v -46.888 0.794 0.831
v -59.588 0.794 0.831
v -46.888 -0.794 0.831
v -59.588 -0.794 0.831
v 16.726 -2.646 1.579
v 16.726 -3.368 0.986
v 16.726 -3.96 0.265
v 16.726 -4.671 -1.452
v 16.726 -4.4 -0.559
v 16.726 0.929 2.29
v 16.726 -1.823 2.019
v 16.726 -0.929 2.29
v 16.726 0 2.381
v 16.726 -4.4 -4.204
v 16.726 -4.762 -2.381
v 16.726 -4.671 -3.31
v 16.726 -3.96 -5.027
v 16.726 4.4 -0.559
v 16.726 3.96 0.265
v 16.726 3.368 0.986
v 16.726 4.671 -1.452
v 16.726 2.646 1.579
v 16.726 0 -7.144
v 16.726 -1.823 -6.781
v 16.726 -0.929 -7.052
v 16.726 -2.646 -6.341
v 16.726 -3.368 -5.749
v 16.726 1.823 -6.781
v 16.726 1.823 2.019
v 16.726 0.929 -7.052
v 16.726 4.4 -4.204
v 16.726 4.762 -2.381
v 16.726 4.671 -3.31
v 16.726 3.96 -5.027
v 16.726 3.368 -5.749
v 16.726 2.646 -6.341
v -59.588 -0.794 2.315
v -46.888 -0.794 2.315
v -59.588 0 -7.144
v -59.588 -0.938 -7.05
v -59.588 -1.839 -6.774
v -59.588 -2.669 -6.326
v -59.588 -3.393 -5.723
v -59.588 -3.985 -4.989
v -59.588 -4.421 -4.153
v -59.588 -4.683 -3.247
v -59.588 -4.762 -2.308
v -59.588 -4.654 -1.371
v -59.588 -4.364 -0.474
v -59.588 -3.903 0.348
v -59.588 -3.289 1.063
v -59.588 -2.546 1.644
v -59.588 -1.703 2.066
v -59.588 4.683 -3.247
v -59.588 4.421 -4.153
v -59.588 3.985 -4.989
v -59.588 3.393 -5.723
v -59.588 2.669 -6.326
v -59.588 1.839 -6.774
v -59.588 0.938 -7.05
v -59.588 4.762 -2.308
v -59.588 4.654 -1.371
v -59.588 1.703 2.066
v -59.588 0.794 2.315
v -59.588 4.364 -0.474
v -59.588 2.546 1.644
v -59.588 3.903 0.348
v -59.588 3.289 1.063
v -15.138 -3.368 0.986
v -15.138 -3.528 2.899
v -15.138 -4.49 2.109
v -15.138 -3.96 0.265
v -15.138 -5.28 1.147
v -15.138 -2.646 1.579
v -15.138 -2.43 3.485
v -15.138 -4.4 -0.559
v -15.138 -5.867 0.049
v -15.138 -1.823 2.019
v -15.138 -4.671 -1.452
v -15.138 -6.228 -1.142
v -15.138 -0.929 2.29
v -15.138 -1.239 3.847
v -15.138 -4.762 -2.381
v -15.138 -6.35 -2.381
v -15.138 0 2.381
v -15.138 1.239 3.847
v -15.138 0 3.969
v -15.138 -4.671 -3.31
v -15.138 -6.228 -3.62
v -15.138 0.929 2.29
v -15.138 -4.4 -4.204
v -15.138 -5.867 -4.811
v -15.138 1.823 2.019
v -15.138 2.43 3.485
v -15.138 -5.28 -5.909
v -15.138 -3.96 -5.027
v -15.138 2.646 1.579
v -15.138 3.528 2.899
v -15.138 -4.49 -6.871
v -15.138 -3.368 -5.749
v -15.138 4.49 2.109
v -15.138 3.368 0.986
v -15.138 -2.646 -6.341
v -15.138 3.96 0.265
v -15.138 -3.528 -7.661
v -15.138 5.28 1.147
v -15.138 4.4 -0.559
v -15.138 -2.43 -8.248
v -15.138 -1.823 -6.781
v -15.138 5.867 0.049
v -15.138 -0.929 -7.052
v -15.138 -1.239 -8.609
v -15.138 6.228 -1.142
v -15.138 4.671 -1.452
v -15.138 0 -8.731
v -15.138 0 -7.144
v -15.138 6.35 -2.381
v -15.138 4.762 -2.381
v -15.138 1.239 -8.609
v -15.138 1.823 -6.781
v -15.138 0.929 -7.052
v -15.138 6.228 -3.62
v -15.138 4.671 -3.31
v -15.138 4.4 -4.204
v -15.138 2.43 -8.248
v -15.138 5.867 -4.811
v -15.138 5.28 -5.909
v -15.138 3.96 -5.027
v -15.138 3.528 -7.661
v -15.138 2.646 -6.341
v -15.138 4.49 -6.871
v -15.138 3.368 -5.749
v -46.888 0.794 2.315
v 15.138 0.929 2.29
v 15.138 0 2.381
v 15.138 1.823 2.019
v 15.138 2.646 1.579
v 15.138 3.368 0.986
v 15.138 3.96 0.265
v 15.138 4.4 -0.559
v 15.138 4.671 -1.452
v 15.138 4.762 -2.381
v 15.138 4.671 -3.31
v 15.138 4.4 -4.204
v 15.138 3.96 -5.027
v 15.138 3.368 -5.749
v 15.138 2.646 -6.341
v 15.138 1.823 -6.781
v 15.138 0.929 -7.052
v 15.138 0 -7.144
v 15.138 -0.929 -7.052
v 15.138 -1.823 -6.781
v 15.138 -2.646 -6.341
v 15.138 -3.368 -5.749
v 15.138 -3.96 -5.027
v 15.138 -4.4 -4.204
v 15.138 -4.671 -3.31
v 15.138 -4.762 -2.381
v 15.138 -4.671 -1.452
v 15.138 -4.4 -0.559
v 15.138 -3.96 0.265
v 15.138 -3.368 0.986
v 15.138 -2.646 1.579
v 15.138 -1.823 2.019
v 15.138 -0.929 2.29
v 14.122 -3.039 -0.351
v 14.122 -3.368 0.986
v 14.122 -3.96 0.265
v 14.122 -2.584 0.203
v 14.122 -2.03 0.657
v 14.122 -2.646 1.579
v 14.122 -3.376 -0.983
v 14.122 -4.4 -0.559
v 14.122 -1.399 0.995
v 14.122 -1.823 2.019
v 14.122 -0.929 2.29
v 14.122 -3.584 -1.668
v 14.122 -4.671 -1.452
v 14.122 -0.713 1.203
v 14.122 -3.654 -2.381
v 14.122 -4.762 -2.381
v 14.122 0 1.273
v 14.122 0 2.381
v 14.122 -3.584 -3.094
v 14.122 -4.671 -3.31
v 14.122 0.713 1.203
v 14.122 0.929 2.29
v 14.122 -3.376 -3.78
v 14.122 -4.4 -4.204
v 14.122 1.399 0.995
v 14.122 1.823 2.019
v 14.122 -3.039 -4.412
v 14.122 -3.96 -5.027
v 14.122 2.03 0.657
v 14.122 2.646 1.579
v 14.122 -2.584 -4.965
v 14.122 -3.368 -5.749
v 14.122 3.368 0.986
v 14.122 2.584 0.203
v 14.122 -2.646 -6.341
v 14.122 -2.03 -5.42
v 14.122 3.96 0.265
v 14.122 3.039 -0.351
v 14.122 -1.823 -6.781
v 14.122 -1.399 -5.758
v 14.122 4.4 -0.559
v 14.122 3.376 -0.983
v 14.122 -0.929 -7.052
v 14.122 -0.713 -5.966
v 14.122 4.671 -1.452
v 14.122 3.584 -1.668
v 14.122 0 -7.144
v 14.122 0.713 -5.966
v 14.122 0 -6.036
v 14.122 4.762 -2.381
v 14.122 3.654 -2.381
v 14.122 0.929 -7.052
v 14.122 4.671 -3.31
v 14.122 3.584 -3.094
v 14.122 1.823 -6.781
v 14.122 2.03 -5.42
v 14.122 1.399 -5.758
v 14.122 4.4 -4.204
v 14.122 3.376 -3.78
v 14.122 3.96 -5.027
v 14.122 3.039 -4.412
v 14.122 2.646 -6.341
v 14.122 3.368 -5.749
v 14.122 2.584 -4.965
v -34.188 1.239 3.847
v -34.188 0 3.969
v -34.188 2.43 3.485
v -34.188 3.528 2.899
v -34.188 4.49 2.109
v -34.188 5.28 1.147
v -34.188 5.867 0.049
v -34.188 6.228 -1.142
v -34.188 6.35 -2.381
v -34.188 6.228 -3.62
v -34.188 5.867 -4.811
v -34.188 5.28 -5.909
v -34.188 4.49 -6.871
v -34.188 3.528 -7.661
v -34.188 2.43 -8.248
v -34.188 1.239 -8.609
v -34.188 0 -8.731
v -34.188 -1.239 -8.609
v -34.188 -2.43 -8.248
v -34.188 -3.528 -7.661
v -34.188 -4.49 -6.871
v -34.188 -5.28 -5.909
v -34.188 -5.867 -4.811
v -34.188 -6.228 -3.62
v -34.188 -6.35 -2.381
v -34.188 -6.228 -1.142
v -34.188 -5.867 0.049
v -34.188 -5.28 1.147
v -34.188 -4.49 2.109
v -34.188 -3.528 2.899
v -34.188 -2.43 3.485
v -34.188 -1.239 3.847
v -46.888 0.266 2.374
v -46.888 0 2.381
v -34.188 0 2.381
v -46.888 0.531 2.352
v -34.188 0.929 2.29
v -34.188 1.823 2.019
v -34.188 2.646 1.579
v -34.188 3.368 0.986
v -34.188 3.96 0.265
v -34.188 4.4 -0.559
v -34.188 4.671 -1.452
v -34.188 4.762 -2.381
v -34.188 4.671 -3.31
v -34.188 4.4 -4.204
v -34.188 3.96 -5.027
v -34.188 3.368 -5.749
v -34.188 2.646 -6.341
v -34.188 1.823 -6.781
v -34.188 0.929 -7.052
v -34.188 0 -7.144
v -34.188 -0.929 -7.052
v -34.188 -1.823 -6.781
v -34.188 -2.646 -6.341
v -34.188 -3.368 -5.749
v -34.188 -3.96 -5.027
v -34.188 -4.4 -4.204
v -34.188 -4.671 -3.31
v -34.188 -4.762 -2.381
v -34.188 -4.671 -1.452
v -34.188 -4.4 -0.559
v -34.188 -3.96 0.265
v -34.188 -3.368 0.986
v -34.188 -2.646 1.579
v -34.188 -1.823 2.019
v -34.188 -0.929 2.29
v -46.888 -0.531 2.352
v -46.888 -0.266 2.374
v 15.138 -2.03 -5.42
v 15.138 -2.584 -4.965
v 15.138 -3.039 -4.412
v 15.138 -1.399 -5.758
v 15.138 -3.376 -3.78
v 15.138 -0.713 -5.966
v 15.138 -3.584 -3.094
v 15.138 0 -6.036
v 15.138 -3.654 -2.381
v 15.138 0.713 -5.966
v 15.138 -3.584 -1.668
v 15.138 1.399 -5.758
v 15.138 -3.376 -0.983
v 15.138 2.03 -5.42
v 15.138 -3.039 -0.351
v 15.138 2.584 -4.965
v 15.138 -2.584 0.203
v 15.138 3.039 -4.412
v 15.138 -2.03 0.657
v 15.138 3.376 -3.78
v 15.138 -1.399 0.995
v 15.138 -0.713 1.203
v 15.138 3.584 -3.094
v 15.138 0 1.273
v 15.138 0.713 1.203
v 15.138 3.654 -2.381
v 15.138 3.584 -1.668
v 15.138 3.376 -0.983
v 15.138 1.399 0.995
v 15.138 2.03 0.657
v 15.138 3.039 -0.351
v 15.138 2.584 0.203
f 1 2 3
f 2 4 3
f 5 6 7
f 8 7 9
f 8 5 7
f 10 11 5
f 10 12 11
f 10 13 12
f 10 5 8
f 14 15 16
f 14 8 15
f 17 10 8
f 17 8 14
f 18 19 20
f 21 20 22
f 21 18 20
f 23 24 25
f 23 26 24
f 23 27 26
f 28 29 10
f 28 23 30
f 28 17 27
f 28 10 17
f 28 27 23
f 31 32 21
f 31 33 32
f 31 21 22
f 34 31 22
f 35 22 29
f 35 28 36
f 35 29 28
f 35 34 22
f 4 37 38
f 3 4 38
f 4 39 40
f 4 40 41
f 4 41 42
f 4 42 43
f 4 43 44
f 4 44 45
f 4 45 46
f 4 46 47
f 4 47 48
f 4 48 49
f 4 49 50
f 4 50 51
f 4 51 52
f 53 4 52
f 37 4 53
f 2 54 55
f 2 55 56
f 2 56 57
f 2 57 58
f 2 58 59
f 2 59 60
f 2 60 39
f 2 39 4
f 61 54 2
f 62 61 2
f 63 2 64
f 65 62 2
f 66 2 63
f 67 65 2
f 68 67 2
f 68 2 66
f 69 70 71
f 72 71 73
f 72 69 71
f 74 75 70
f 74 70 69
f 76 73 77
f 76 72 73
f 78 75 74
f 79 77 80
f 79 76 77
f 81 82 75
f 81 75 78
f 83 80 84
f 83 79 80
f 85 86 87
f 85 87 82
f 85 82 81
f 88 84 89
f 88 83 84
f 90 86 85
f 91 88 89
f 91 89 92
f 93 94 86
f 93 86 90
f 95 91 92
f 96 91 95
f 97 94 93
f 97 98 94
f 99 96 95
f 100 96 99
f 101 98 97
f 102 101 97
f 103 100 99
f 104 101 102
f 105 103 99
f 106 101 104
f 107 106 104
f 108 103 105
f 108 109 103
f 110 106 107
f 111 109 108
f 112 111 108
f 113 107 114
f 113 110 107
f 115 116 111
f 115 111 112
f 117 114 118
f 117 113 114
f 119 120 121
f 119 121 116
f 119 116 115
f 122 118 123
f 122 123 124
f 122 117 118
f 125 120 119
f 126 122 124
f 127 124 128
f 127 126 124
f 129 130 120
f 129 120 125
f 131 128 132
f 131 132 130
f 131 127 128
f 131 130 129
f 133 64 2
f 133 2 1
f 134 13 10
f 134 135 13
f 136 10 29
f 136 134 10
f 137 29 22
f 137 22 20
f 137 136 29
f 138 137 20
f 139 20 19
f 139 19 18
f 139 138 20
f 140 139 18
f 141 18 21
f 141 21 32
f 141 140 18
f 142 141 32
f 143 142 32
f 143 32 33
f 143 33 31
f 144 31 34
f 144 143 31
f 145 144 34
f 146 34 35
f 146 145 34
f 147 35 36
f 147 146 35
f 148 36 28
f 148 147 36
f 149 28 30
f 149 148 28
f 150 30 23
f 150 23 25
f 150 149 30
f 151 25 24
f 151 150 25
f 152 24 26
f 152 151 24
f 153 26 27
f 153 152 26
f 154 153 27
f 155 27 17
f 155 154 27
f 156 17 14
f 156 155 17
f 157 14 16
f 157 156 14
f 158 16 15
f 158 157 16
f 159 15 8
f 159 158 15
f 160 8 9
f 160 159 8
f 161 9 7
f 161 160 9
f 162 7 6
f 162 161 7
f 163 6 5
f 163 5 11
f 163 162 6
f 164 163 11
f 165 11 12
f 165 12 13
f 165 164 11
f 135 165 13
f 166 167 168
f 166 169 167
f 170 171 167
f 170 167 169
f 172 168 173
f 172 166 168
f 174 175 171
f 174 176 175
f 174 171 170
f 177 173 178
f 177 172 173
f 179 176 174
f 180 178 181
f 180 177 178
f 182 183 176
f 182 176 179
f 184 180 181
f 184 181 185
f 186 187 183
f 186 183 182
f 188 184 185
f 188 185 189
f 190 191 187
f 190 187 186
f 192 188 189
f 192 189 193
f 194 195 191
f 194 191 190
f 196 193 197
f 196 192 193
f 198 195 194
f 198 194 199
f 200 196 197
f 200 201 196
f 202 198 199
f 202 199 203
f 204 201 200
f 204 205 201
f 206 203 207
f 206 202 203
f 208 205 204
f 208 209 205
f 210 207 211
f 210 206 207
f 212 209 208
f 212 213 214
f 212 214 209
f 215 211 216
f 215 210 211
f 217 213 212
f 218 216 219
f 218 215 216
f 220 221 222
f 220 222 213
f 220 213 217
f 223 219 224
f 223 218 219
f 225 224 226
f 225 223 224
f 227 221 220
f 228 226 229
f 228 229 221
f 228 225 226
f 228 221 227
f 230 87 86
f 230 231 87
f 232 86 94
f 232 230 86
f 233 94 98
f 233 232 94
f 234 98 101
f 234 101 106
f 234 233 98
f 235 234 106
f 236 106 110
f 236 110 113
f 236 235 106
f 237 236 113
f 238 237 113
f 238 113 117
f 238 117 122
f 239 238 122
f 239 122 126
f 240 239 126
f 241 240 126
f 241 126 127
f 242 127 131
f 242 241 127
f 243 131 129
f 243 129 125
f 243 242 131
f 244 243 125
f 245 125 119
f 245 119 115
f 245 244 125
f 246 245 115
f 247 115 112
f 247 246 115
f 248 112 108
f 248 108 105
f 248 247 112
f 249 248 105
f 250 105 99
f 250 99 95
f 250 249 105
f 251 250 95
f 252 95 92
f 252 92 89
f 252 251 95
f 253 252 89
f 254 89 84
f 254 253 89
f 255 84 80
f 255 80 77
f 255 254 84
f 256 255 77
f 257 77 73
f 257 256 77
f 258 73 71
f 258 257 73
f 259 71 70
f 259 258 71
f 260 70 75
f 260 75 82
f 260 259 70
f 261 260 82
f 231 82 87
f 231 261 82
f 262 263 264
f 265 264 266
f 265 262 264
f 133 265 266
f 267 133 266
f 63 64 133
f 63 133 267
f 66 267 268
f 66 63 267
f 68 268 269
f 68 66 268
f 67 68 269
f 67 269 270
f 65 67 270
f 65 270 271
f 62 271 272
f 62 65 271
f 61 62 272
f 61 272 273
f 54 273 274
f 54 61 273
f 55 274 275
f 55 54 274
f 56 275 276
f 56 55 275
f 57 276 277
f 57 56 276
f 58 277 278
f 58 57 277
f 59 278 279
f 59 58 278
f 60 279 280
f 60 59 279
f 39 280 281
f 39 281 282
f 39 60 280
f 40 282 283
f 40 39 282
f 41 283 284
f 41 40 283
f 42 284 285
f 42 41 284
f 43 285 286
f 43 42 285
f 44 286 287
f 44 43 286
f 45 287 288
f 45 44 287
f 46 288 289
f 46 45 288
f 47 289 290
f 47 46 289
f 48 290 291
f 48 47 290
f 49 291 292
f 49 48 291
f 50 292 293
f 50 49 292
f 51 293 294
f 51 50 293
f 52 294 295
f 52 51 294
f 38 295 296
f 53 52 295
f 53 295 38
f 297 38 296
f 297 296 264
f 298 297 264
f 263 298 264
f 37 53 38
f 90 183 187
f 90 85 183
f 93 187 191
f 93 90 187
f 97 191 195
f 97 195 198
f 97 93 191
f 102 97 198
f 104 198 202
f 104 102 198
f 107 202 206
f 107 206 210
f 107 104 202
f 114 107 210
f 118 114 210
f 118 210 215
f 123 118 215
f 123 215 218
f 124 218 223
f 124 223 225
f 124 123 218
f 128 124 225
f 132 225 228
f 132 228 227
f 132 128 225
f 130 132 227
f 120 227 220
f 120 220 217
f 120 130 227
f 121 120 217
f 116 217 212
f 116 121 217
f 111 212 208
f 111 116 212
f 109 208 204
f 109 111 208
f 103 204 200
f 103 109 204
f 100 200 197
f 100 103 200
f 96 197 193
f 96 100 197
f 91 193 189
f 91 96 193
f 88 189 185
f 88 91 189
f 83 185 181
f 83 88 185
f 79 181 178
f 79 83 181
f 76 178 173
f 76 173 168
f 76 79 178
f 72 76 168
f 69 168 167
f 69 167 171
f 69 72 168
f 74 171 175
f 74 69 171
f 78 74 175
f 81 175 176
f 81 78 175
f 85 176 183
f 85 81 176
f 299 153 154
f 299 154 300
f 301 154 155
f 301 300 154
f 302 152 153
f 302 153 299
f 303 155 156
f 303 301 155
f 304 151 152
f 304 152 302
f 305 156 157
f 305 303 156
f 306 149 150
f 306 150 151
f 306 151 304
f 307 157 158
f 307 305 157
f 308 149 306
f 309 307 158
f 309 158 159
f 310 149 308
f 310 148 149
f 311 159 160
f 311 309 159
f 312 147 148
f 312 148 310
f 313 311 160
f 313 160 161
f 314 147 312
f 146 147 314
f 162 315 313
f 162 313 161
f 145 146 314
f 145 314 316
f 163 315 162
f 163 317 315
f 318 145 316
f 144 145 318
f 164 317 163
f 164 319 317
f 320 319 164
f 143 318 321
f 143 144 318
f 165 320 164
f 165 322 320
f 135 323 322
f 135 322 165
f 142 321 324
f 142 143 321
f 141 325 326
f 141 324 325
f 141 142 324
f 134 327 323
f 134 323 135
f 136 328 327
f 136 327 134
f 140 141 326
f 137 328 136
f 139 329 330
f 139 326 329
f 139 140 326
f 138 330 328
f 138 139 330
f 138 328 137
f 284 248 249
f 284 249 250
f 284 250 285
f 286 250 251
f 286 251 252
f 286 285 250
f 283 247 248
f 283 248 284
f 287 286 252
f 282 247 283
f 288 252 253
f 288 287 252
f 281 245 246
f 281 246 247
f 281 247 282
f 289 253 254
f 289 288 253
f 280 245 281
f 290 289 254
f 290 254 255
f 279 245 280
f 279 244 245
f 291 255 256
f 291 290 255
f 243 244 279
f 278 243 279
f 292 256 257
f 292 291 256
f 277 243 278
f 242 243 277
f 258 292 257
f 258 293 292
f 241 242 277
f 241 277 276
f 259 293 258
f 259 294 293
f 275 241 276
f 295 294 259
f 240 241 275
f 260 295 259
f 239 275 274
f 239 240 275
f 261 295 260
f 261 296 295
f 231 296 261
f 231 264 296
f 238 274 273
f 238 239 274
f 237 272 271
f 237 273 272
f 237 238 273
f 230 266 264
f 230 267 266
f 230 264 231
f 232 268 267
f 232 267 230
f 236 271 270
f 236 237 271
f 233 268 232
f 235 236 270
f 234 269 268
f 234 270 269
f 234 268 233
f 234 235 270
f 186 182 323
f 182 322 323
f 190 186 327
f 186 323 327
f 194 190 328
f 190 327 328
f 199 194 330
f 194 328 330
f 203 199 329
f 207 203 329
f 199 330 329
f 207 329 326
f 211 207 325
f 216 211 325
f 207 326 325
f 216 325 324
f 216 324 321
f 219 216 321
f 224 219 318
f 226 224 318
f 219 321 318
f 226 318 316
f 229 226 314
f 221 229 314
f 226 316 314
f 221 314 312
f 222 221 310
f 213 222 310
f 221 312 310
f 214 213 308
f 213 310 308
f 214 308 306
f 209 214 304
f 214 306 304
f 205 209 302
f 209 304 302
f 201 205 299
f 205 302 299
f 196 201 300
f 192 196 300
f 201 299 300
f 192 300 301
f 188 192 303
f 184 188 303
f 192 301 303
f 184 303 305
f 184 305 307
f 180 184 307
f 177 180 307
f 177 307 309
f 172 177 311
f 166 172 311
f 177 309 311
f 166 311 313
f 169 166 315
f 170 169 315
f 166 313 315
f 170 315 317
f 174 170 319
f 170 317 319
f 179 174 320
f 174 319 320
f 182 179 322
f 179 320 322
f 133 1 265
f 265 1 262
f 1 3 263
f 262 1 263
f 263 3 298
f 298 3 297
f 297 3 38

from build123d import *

# Parameters (mm, degrees)
F0_W          = 6.35
F0_H          = 4.7625
F0_W_2        = 4.5974
F0_W_3        = 1.016
F0_H_2        = 3.6544946585
F2_W          = 12.7
F2_H          = 1.5875
F3_DEPTH      = 0.79375
F3_DEPTH_BACK = 0.79375


with BuildPart() as f1:
    # F0 (on Front) → F1 (revolve)
    with BuildSketch(Plane.XZ):
        Rectangle(F0_W, F0_H)
        with Locations((5.4737, 0)):
            Rectangle(F0_W_2, F0_H)
        with Locations((-5.4737, 0)):
            Rectangle(F0_W_2, F0_H)
        Polygon((14.1224, 2.38125), (7.7724, 2.38125), (7.7724, -2.38125), (14.1224, -2.38125), (14.1224, 1.2732446585), align=None)
        with Locations((-10.9474, 0)):
            Rectangle(F0_W, F0_H)
        with Locations((-14.6304, 0)):
            Rectangle(F0_W_3, F0_H)
        with Locations((14.6304, -0.5540026708)):
            Rectangle(F0_W_3, F0_H_2)
        Polygon((-15.1384, -2.38125), (-15.1384, 2.38125), (-15.1384, 3.96875), (-34.1884, 3.96875), (-34.1884, 2.38125), (-34.1884, -0.79375), (-34.1884, -2.38125), align=None)
        Polygon((15.1384, 1.2732446585), (15.1384, -2.38125), (16.7259, -2.38125), (16.7259, 2.38125), (15.1384, 2.38125), align=None)
        Polygon((-59.5884, -2.38125), (-34.1884, -2.38125), (-34.1884, -0.79375), (-34.1884, 2.38125), (-59.5884, 2.38125), align=None)
    revolve(axis=Axis((0, 0, -2.38125), (-1, 0, 0)))

    # F2 (on Front) → F3 (cut, two sides)
    with BuildSketch(Plane.XZ) as f3_sk:
        with Locations((-53.2384, 1.6244021334)):
            Rectangle(F2_W, F2_H)
    extrude(amount=-F3_DEPTH, mode=Mode.SUBTRACT)
    extrude(f3_sk.sketch, amount=F3_DEPTH_BACK, mode=Mode.SUBTRACT)


solid = f1.part
